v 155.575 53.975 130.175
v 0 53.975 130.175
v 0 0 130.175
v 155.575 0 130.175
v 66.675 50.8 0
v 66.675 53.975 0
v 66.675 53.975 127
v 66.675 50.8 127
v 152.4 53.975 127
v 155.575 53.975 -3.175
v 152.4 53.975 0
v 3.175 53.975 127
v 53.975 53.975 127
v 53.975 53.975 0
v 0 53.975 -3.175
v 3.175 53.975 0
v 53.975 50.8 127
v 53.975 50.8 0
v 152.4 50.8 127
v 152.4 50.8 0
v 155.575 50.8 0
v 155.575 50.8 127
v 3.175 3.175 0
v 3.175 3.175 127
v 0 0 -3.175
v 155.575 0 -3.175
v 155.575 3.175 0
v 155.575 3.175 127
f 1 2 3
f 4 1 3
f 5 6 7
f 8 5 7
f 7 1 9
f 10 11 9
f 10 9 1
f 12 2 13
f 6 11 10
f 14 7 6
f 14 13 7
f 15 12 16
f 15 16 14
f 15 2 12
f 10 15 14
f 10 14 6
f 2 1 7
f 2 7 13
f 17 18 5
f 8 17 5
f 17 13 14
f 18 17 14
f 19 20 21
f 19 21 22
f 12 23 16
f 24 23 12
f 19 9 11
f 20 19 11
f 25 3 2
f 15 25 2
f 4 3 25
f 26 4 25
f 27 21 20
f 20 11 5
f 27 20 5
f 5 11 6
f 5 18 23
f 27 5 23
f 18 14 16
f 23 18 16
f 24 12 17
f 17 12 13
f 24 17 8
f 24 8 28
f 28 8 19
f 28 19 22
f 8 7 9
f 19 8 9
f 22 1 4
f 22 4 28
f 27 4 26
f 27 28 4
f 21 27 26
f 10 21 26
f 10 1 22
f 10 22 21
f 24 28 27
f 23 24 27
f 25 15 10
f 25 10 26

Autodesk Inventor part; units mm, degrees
ref_plane "YZ Plane" through (0, 0, 0) normal (1, 0, 0) x (0, 1, 0)
ref_plane "XZ Plane" through (0, 0, 0) normal (0, 1, 0) x (-1, 0, 0)
ref_plane "XY Plane" through (0, 0, 0) normal (0, 0, 1) x (1, 0, 0)
sketch "Sketch1" plane through (0, 0, 0) normal (0, 1, 0) x (-1, 0, 0)
  line L0 (0, 0) -> (-152.4, 0)
  line L1 (-152.4, 0) -> (-152.4, 127)
  line L2 (-152.4, 127) -> (0, 127)
  line L3 (0, 127) -> (0, 0)
  dimension "d0" = 152.4
  dimension "d1" = 127
extrude "Extrusion1" add sketch "Sketch1" along normal blind 3.175
sketch "Sketch2" plane through (0, 3.175, 0) normal (0, 1, 0) x (1, 0, 0)
  line L0 (152.4, 0) -> (0, 0) projected
  line L1 (0, 0) -> (3.175, 0)
  line L2 (3.175, 0) -> (3.175, -127)
  line L3 (3.175, -127) -> (0, -127)
  line L4 (0, -127) -> (0, 0)
  dimension "d4" = 3.175
  dimension "d5" = 127
extrude "Extrusion2" add sketch "Sketch2" along normal blind 50.8
sketch "Sketch3" plane through (0, 0, 127) normal (0, 0, 1) x (1, 0, 0)
  line L0 (0, 0) -> (0, 53.975) projected
  line L1 (152.4, 0) -> (152.4, 3.175) projected
  line L2 (0, 53.975) -> (152.4, 53.975)
  line L3 (152.4, 53.975) -> (152.4, 0)
  line L4 (152.4, 0) -> (0, 0)
  line L5 (0, 0) -> (0, 53.975)
extrude "Extrusion3" add sketch "Sketch3" along normal blind 3.175
sketch "Sketch4" plane through (152.4, 0, 0) normal (0, 0, -1) x (-1, 0, 0)
  line L0 (152.4, 0) -> (152.4, 53.975) projected
  line L1 (152.4, 0) -> (0, 0)
  line L2 (0, 0) -> (0, 53.975)
  line L3 (0, 53.975) -> (152.4, 53.975)
  line L4 (152.4, 53.975) -> (152.4, 0)
extrude "Extrusion4" add sketch "Sketch4" along normal blind 3.175
sketch "Sketch5" plane through (152.4, 3.175, 127) normal (1, 0, 0) x (0, 0, -1)
  line L0 (-3.175, 50.8) -> (-3.175, -3.175) projected
  line L1 (-3.175, -3.175) -> (130.175, -3.175) projected
  line L2 (-3.175, 50.8) -> (130.175, 50.8)
  line L3 (130.175, 50.8) -> (130.175, -3.175)
  line L4 (130.175, -3.175) -> (-3.175, -3.175)
  line L5 (-3.175, -3.175) -> (-3.175, 50.8)
  line L6 (127, 47.625) -> (0, 47.625)
  line L7 (0, 47.625) -> (0, 0)
  line L8 (0, 0) -> (127, 0)
  line L9 (127, 0) -> (127, 47.625)
  point P0 (127, -3.175)
  dimension "d12" = 3.175
extrude "Extrusion5" add sketch "Sketch5" along normal blind 3.175
sketch "Sketch6" plane through (0, 53.975, 0) normal (0, 1, 0) x (1, 0, 0)
  line L0 (152.4, -127) -> (152.4, 0) construction
  line L1 (152.4, 0) -> (101.6, 0) construction
  line L2 (101.6, 0) -> (88.9, 0) construction
  line L3 (88.9, -127) -> (101.6, -127) construction
  line L4 (3.175, 0) -> (15.875, 0) construction
  line L5 (3.175, -127) -> (3.175, 0) construction
  line L6 (3.175, 0) -> (53.975, 0) construction
  line L7 (3.175, 0) -> (53.975, 0) construction
  line L8 (53.975, 0) -> (66.675, 0)
  line L9 (66.675, 0) -> (66.675, -127)
  line L10 (66.675, -127) -> (53.975, -127)
  line L11 (53.975, -127) -> (53.975, 0)
  point P0 (0, 0)
  dimension "d16" = 12.7
  dimension "d20" = 50.8
  dimension "d21" = 0
  dimension "d22" = 12.7
  dimension "d23" = 127
extrude "Extrusion6" add sketch "Sketch6" against normal blind 3.175
properties part number "ShootingMech_Housing2"
